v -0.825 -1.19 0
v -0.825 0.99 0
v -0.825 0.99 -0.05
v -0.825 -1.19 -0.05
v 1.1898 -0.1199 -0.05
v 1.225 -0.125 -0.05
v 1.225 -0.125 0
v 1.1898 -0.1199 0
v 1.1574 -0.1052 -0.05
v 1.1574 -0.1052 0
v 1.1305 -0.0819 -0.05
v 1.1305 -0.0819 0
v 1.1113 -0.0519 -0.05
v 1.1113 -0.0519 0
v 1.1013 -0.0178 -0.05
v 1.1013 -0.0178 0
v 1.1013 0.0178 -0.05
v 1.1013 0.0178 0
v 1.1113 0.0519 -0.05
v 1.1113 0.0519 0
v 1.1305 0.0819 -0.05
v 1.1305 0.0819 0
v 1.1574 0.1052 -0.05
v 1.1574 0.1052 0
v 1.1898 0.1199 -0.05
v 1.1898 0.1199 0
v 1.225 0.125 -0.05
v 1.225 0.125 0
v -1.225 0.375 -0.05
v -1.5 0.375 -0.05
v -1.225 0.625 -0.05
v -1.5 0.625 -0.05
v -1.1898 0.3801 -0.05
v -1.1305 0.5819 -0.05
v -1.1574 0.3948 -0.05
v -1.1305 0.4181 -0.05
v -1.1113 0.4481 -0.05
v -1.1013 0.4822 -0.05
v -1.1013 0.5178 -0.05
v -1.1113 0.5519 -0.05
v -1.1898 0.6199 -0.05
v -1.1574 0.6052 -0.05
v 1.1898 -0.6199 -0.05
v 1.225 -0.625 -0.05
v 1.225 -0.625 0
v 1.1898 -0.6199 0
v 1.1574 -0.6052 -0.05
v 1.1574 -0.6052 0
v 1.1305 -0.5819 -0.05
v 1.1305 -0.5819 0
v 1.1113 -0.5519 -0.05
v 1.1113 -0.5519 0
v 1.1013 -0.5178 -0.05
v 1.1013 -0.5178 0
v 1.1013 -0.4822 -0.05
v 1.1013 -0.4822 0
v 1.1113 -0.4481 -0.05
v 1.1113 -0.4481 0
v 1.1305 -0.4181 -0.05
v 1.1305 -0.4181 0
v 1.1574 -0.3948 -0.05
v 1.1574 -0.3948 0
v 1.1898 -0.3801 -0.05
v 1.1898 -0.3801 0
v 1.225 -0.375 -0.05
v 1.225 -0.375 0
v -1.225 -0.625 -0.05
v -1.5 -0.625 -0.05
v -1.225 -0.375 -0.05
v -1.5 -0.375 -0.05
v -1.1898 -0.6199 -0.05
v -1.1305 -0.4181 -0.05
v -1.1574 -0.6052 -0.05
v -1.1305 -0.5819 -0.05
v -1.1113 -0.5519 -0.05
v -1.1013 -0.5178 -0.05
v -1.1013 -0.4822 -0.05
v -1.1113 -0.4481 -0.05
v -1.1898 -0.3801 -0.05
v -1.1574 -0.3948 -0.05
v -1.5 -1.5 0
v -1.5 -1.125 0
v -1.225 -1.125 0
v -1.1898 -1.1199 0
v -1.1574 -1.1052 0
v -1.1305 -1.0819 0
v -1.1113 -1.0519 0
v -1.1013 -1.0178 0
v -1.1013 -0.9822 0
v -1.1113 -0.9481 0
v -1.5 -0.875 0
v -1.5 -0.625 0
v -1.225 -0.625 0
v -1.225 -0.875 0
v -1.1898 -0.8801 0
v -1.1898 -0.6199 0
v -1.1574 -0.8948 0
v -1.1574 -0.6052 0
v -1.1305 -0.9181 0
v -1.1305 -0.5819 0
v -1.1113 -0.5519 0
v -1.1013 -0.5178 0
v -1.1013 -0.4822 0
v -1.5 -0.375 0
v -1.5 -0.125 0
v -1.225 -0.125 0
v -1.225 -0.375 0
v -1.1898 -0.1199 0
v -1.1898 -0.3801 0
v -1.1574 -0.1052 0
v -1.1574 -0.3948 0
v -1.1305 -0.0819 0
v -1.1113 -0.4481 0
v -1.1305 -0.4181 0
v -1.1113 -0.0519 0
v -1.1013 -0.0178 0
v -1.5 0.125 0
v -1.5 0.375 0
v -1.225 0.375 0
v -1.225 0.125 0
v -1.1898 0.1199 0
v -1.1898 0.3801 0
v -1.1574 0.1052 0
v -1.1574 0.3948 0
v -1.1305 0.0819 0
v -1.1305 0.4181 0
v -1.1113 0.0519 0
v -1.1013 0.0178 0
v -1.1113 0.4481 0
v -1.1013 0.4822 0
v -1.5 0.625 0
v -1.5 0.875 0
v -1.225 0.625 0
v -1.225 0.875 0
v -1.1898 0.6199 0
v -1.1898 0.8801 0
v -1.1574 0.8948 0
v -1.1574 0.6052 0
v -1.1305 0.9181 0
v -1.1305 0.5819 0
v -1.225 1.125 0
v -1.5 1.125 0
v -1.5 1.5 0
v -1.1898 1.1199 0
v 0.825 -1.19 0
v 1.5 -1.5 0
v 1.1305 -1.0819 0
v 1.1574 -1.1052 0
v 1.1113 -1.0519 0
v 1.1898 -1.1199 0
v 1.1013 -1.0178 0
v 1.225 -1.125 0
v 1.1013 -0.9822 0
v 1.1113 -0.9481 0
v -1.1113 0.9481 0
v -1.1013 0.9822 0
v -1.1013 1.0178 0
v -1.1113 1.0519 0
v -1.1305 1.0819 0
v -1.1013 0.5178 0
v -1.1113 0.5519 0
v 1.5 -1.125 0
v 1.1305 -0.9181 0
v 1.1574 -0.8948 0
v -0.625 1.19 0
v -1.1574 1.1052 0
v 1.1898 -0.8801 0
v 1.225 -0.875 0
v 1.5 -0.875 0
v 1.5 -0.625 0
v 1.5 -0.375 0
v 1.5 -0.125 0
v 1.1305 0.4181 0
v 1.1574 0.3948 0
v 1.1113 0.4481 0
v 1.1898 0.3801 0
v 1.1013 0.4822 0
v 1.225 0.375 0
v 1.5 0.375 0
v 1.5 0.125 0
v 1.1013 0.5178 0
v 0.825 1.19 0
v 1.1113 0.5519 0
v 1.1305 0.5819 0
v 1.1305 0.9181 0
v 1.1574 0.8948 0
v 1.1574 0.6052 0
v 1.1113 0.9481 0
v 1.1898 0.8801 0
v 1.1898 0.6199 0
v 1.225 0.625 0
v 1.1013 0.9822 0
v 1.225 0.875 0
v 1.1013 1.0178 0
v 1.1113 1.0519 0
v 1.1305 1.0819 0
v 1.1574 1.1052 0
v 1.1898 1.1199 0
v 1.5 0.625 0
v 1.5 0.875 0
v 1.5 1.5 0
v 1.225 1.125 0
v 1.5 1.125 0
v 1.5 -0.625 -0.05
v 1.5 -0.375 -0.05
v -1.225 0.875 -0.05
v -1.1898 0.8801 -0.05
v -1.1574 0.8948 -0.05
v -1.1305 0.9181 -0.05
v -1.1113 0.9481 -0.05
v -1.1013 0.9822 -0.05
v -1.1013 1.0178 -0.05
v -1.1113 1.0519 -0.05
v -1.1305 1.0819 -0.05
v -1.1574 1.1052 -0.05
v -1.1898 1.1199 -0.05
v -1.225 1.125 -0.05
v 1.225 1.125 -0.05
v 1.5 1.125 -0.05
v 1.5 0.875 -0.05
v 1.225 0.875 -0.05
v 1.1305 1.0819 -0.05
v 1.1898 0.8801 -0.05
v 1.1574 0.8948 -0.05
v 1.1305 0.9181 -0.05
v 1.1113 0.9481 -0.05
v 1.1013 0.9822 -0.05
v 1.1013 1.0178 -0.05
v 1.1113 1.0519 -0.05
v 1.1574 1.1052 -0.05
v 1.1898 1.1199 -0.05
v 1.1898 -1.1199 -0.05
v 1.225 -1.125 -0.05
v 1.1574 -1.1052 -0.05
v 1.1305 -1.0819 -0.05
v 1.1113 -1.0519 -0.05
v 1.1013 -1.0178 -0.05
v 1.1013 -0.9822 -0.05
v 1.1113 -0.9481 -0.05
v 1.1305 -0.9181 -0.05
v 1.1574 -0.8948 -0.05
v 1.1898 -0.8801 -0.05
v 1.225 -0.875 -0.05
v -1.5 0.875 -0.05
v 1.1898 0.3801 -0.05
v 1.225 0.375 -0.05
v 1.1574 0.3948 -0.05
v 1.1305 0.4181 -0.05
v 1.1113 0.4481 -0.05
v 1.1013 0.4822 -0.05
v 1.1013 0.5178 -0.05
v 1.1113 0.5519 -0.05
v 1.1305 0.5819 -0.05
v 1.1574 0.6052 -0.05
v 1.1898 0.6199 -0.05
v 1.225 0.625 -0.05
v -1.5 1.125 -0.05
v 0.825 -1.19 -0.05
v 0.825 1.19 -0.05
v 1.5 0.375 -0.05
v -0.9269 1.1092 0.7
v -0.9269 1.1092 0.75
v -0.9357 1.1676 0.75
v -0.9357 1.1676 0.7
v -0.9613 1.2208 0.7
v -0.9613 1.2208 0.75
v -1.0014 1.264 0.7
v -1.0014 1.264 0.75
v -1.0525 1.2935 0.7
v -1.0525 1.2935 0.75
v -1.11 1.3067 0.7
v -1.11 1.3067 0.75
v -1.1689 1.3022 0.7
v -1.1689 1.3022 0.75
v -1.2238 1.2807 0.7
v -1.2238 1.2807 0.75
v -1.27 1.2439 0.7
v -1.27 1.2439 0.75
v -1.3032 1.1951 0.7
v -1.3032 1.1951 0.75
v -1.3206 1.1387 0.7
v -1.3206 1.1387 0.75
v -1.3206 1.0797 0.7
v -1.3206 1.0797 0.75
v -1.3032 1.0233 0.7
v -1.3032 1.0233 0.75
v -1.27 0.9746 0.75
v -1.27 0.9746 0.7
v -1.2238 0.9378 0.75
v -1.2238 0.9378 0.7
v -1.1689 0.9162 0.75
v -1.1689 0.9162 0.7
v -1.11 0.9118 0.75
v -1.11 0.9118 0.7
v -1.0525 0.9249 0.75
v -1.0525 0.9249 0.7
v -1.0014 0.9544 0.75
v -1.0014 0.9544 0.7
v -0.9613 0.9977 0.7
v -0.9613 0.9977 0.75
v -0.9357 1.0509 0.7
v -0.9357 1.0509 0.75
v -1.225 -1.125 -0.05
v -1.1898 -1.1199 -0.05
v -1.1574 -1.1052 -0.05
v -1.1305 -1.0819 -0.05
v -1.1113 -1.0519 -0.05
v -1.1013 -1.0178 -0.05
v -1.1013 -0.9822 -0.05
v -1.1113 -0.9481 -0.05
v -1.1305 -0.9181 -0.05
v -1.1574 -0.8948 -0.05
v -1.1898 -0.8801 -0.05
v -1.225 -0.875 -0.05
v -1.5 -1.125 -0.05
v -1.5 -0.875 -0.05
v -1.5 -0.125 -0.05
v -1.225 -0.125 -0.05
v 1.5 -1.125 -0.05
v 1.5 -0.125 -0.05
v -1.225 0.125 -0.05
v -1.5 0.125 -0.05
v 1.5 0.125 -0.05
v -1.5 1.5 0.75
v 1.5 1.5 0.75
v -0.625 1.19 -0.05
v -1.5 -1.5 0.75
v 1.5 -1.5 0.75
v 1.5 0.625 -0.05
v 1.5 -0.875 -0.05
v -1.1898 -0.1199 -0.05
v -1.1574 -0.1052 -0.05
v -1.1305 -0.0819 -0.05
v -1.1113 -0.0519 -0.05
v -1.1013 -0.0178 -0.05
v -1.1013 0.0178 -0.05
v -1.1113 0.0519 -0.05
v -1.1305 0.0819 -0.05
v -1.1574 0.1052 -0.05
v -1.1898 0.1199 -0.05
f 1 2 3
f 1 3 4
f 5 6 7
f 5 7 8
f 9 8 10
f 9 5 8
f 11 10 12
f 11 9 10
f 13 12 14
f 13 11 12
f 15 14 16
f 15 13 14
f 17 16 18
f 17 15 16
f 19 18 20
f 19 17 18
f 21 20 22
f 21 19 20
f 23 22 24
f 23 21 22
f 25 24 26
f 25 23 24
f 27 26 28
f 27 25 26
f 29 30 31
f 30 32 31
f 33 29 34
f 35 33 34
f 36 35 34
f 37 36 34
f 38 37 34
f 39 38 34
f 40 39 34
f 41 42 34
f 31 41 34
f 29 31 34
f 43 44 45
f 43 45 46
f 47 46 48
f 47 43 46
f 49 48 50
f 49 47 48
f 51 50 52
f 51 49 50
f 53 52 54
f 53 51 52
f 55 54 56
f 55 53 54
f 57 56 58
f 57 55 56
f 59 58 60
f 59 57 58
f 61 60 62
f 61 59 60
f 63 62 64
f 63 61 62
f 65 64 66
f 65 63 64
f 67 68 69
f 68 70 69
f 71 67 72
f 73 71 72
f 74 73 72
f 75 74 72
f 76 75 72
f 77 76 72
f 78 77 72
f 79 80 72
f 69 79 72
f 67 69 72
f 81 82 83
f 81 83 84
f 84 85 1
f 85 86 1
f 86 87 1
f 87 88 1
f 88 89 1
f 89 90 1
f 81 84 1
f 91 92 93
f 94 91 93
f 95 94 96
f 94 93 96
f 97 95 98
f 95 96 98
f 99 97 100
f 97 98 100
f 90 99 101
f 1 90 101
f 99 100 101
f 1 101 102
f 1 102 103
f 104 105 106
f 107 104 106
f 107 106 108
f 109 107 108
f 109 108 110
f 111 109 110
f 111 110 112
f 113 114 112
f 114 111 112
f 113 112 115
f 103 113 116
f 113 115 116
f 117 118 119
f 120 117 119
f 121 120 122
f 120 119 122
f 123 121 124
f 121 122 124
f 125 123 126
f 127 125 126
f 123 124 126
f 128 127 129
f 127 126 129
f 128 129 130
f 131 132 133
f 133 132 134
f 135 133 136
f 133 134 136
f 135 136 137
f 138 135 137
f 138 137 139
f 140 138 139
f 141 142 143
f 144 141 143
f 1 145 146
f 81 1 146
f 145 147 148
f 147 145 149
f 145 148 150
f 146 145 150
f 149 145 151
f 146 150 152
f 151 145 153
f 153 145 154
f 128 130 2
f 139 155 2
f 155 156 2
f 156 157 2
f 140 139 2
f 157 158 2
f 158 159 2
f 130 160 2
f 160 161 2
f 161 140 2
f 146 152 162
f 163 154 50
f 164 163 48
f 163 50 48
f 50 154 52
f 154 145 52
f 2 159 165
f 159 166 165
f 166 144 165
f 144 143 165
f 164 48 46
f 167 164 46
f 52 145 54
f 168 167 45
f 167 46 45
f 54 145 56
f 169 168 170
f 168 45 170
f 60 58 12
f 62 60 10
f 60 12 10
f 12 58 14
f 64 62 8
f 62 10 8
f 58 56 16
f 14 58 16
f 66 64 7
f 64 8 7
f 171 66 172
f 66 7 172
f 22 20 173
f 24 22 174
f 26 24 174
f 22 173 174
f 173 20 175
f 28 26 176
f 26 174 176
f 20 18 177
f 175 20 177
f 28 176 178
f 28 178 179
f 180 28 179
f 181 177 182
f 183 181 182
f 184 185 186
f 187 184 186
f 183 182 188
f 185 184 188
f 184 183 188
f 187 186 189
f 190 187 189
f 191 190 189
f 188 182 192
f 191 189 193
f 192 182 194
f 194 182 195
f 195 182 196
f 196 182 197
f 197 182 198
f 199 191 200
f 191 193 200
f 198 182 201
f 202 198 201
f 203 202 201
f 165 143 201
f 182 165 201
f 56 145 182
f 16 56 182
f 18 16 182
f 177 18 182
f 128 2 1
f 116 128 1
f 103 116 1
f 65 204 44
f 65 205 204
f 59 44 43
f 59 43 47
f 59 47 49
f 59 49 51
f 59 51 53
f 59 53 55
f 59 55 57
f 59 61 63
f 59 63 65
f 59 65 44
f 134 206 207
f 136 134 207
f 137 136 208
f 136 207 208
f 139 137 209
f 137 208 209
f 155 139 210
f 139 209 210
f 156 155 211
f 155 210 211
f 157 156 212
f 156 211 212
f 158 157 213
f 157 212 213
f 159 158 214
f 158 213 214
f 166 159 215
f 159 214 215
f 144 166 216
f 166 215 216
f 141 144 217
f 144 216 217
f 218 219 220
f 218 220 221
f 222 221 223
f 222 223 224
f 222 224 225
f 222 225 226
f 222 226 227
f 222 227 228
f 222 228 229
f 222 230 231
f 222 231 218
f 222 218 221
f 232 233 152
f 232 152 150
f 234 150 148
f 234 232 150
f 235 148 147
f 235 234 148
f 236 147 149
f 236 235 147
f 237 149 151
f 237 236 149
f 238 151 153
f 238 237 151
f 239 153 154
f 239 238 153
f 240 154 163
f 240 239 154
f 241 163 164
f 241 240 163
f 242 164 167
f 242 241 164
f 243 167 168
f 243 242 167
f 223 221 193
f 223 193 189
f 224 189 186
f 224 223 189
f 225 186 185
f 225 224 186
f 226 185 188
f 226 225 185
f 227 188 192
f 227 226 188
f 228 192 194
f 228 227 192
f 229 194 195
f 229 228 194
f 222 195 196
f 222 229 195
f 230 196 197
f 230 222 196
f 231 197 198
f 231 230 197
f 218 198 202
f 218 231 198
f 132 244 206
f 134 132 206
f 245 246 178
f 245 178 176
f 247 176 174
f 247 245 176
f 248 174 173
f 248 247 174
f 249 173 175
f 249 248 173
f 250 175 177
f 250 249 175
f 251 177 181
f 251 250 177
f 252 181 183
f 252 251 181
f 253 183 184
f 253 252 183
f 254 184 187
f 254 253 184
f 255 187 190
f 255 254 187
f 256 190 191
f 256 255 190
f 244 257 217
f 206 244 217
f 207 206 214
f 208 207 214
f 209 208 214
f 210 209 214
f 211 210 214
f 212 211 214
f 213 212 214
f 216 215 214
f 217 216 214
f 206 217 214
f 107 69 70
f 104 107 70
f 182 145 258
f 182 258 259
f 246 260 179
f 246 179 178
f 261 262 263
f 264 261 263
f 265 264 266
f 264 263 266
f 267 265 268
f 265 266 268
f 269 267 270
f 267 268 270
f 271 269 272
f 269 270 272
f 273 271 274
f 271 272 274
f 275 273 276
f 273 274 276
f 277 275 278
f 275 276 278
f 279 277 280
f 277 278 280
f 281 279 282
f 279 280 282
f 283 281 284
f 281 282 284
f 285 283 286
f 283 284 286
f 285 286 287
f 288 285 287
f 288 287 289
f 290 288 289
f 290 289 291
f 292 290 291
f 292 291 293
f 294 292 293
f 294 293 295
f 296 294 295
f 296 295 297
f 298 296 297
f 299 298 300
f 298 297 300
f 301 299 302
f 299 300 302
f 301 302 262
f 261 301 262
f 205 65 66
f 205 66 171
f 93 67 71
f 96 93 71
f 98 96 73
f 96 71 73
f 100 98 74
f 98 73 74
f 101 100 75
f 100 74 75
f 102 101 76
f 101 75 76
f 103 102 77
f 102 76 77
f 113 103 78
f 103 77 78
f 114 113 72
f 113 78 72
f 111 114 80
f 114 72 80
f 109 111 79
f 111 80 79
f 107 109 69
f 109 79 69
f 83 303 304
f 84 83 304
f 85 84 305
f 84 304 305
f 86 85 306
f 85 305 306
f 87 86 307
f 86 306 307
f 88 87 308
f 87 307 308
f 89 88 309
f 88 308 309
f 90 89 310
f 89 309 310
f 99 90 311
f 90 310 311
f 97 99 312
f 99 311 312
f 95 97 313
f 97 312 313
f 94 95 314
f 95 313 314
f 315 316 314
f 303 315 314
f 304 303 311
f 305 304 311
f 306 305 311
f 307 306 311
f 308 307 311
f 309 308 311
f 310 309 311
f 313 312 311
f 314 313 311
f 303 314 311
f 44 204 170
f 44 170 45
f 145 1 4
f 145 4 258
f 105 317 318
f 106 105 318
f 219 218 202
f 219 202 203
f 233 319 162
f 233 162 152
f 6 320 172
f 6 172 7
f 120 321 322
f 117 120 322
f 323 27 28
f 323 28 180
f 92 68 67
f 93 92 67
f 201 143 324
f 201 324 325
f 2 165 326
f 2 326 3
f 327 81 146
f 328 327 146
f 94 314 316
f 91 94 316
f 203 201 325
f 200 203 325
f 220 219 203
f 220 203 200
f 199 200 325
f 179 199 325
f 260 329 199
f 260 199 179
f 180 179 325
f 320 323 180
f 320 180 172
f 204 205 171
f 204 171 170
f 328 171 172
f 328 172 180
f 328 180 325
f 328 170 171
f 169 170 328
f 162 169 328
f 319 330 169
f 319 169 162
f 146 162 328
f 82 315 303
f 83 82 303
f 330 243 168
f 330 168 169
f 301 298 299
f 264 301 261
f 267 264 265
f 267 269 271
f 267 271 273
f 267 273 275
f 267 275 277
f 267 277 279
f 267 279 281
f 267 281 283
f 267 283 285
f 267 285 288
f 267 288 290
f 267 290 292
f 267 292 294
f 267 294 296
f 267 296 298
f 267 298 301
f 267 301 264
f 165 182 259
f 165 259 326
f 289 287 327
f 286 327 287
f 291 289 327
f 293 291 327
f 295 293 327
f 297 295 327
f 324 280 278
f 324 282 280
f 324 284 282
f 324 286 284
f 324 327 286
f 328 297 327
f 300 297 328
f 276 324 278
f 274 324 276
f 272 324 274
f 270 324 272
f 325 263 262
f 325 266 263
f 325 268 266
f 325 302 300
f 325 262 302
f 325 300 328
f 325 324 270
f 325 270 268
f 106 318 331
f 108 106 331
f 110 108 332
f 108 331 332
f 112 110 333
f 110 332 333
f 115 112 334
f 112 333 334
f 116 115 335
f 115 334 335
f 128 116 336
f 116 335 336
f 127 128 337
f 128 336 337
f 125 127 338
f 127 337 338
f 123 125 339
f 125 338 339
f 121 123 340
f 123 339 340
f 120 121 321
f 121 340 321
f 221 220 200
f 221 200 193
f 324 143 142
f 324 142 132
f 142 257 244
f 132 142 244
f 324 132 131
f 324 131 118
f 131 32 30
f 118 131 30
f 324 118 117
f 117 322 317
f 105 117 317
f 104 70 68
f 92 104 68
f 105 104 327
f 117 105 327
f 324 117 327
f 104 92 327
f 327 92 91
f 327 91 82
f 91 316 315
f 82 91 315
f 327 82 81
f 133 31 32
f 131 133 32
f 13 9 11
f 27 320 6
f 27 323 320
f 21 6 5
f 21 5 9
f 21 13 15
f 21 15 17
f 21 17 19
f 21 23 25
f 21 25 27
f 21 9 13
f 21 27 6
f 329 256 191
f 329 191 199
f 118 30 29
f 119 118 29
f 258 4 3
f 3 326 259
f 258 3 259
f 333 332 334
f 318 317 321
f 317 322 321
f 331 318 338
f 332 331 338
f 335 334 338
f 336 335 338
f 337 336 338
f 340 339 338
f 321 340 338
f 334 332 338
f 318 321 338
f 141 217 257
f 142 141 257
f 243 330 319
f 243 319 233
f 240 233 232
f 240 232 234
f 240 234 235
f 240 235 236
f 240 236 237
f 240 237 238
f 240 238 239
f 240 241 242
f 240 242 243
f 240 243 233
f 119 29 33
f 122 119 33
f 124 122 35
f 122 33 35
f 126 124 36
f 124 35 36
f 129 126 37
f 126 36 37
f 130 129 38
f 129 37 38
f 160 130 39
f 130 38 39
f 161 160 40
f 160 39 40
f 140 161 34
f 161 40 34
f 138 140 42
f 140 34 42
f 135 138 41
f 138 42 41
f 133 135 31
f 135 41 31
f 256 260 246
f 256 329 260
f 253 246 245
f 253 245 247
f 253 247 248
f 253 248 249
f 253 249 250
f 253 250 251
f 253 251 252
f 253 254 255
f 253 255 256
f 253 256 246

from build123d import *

# Parameters (mm, degrees)
SKETCH1_W           = 3
SKETCH1_H           = 3
BOSS_EXTRUDE1_DEPTH = 0.75
BOSS_EXTRUDE2_START = -0.05
BOSS_EXTRUDE2_DEPTH = 0.25
LPATTERN1_START     = -0.05
LPATTERN1_DEPTH     = 0.05
LPATTERN2_START     = -0.05
LPATTERN2_DEPTH     = 0.05
SKETCH3_R           = 0.197976387
CUT_EXTRUDE1_DEPTH  = 0.05
BOSS_EXTRUDE3_DEPTH = 0.05


with BuildPart() as part:
    # Sketch1 → Boss-Extrude1 (new body)
    with BuildSketch(Plane.XY):
        Rectangle(SKETCH1_W, SKETCH1_H)
    extrude(amount=BOSS_EXTRUDE1_DEPTH)

    # Sketch2 → Boss-Extrude2 (add)
    with BuildSketch(Plane.XY.offset(BOSS_EXTRUDE2_START)):
        with BuildLine():
            Line((-1.5, -0.125), (-1.225, -0.125))
            ThreePointArc((-1.225, -0.125), (-1.1, 0), (-1.225, 0.125))
            Line((-1.225, 0.125), (-1.5, 0.125))
            Line((-1.5, 0.125), (-1.5, -0.125))
        make_face()
    boss_extrude2 = extrude(amount=BOSS_EXTRUDE2_DEPTH)

    # LPattern1: read off the stored shape, not the designer's step
    # LPattern1 outline → LPattern1 (add)
    with BuildSketch(Plane.XY.offset(LPATTERN1_START)):
        with BuildLine():
            Line((-1.5, 0.375), (-1.225, 0.375))
            ThreePointArc((-1.225, 0.375), (-1.1, 0.5), (-1.225, 0.625))
            Line((-1.225, 0.625), (-1.5, 0.625))
            Line((-1.5, 0.625), (-1.5, 0.375))
        make_face()
        with BuildLine():
            Line((-1.5, 1.125), (-1.5, 0.875))
            Line((-1.5, 0.875), (-1.225, 0.875))
            ThreePointArc((-1.225, 0.875), (-1.1, 1), (-1.225, 1.125))
            Line((-1.225, 1.125), (-1.5, 1.125))
        make_face()
    lpattern1 = extrude(amount=LPATTERN1_DEPTH)

    # LPattern2: read off the stored shape, not the designer's step
    # LPattern2 outline → LPattern2 (add)
    with BuildSketch(Plane.XY.offset(LPATTERN2_START)):
        with BuildLine():
            Line((-1.5, -0.625), (-1.225, -0.625))
            ThreePointArc((-1.225, -0.625), (-1.1, -0.5), (-1.225, -0.375))
            Line((-1.225, -0.375), (-1.5, -0.375))
            Line((-1.5, -0.375), (-1.5, -0.625))
        make_face()
        with BuildLine():
            Line((-1.225, -0.875), (-1.5, -0.875))
            Line((-1.5, -0.875), (-1.5, -1.125))
            Line((-1.5, -1.125), (-1.225, -1.125))
            ThreePointArc((-1.225, -1.125), (-1.1, -1), (-1.225, -0.875))
        make_face()
    lpattern2 = extrude(amount=LPATTERN2_DEPTH)

    # Mirror1: Boss-Extrude2, LPattern1, LPattern2 across plane
    add(boss_extrude2.mirror(Plane(origin=(0, 0, 0), x_dir=(0, 0, 1), z_dir=(1, 0, 0))))
    add(lpattern1.mirror(Plane(origin=(0, 0, 0), x_dir=(0, 0, 1), z_dir=(1, 0, 0))))
    add(lpattern2.mirror(Plane(origin=(0, 0, 0), x_dir=(0, 0, 1), z_dir=(1, 0, 0))))

    # Sketch3 → Cut-Extrude1 (cut)
    with BuildSketch(Plane.XY.offset(0.75)):
        with Locations((-1.124834532, 1.109231375)):
            Circle(SKETCH3_R)
    extrude(amount=-CUT_EXTRUDE1_DEPTH, mode=Mode.SUBTRACT)

    # Sketch4 → Boss-Extrude3 (add)
    with BuildSketch(Plane.XY):
        Polygon((-0.625, 1.19), (-0.825, 0.99), (-0.825, -1.19), (0.825, -1.19), (0.825, 1.19), align=None)
    extrude(amount=-BOSS_EXTRUDE3_DEPTH)


solid = part.part
